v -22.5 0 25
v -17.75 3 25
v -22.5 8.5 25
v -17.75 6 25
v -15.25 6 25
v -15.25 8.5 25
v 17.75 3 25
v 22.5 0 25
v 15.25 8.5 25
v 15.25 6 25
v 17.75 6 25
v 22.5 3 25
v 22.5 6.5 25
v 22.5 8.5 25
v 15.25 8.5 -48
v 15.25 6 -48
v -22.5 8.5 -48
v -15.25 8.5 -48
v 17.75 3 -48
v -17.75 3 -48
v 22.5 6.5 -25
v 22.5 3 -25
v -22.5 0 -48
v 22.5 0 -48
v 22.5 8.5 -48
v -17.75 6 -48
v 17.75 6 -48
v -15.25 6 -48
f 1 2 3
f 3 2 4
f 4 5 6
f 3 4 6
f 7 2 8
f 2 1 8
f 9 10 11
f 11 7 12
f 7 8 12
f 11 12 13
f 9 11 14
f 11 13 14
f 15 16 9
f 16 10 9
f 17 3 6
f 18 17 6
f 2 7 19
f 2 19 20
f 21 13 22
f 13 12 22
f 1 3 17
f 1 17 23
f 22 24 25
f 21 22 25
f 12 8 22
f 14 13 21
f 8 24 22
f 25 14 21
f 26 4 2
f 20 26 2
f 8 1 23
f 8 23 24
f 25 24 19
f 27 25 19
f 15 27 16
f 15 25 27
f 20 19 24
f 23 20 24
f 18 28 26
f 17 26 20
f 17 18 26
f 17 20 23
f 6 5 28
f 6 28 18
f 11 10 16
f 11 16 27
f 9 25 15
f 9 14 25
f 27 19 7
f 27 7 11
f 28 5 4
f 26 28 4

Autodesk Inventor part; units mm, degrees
ref_plane "YZ Plane" through (0, 0, 0) normal (1, 0, 0) x (0, 1, 0)
ref_plane "XZ Plane" through (0, 0, 0) normal (0, 1, 0) x (-1, 0, 0)
ref_plane "XY Plane" through (0, 0, 0) normal (0, 0, 1) x (1, 0, 0)
sketch "Sketch1" plane through (0, 0, 0) normal (0, 1, 0) x (-1, 0, 0)
  line L0 (-32.5, 25) -> (32.5, 25)
  line L1 (32.5, 25) -> (32.5, -25)
  line L2 (32.5, -25) -> (-32.5, -25)
  line L3 (-32.5, -25) -> (-32.5, 25)
  line L4 (-32.5, 25) -> (32.5, -25) construction
  line L5 (32.5, 25) -> (-32.5, -25) construction
  point P0 (0, 0)
  dimension "d0" = 65
  dimension "d1" = 50
extrude "Extrusion1" add sketch "Sketch1" along normal blind 3
sketch "Sketch2" plane through (0, 3, 0) normal (0, 1, 0) x (1, 0, 0)
  line L0 (32.5, 25) -> (-32.5, 25) projected
  line L1 (-18.25, -25) -> (18.25, -25)
  line L2 (18.25, -25) -> (18.25, 25)
  line L3 (18.25, 25) -> (-18.25, 25)
  line L4 (-18.25, 25) -> (-18.25, -25)
  line L5 (-18.25, -25) -> (18.25, 25) construction
  line L6 (18.25, -25) -> (-18.25, 25) construction
  line L7 (-22.5, -25) -> (22.5, -25)
  line L8 (22.5, -25) -> (22.5, 25)
  line L9 (22.5, 25) -> (-22.5, 25)
  line L10 (-22.5, 25) -> (-22.5, -25)
  line L11 (-22.5, -25) -> (22.5, 25) construction
  line L12 (22.5, -25) -> (-22.5, 25) construction
  point P0 (0, 0)
  dimension "d4" = 36.5
  dimension "d5" = 45
extrude "Extrusion2" add sketch "Sketch2" along normal blind 3.5 contours L8 L7 L2 L0 | L4 L7 L10 L0
sketch "Sketch3" plane through (0, 6.5, 0) normal (0, 1, 0) x (1, 0, 0)
  line L0 (-22.5, 25) -> (-32.5, 25) projected
  line L1 (-22.5, 25) -> (-15.25, 25)
  line L2 (-15.25, 25) -> (-15.25, -25)
  line L3 (-15.25, -25) -> (-22.5, -25)
  line L4 (-22.5, -25) -> (-22.5, 25)
  line L5 (-32.5, -25) -> (32.5, -25) projected
  line L6 (32.5, 25) -> (-32.5, 25) projected
  line L7 (22.4999, -25) -> (15.2499, -25)
  line L8 (15.2499, -25) -> (15.2499, 25)
  line L9 (15.2499, 25) -> (22.4999, 25)
  line L10 (22.4999, 25) -> (22.4999, -25)
  point P0 (0, 0)
  dimension "d8" = 7.25
  dimension "d9" = 7.25
extrude "Extrusion3" add sketch "Sketch3" along normal blind 2 contours L1 L2 L3 L4 | L6 L10 L5 L8
sketch "Sketch4" plane through (0, 3, 0) normal (0, 1, 0) x (1, 0, 0)
  line L0 (-22.5, 25) -> (-22.5, -25) projected
  line L1 (-32.5, 25) -> (-32.5, -25) projected
  line L2 (-22.5, 25) -> (-32.5, 25)
  line L3 (-32.5, 25) -> (-32.5, -25)
  line L4 (-32.5, -25) -> (-22.5, -25)
  line L5 (-22.5, -25) -> (-22.5, 25)
  line L6 (22.4999, -25) -> (22.4999, 25) projected
  line L7 (-32.5, -25) -> (32.5, -25) projected
  line L8 (22.4999, 25) -> (32.5, 25)
  line L9 (32.5, 25) -> (32.5, -25)
  line L10 (32.5, -25) -> (22.4999, -25)
  line L11 (22.4999, -25) -> (22.4999, 25)
  point P0 (0, 0)
extrude "Extrusion4" cut sketch "Sketch4" against normal blind 10
sketch "Sketch5" plane through (-18.25, 3, 25) normal (1, 0, 0) x (0, 0, -1)
  line L0 (0, 3.5) -> (50, 3.5) projected
  line L1 (50, 0) -> (0, 0)
  line L2 (0, 0) -> (0, 3.5)
  line L3 (0, 3.5) -> (50, 3.5)
  line L4 (50, 3.5) -> (50, 0)
  point P0 (25, -3)
extrude "Extrusion5" add sketch "Sketch5" along normal blind 0.5
sketch "Sketch6" plane through (18.25, 3, -25) normal (-1, 0, 0) x (0, 0, 1)
  line L0 (50, 0) -> (50, 3.5) projected
  line L1 (0, 0) -> (0, -3) projected
  line L2 (50, 3.5) -> (0, 3.5)
  line L3 (0, 3.5) -> (0, 0)
  line L4 (0, 0) -> (50, 0)
  line L5 (50, 0) -> (50, 3.5)
  point P0 (25, -3)
extrude "Extrusion6" add sketch "Sketch6" along normal blind 0.5
sketch "Sketch7" plane through (0, 6.5, 0) normal (0, -1, 0) x (1, 0, 0)
  line L0 (15.2499, 25) -> (17.75, 25) projected
  line L1 (15.2499, -25) -> (17.75, -25)
  line L2 (17.75, -25) -> (17.75, 25)
  line L3 (17.75, 25) -> (15.2499, 25)
  line L4 (15.2499, 25) -> (15.2499, -25)
  line L5 (-15.25, 25) -> (-17.75, 25)
  line L6 (-17.75, 25) -> (-17.75, -25)
  line L7 (-17.75, -25) -> (-15.25, -25)
  line L8 (-15.25, -25) -> (-15.25, 25)
  point P0 (0, 0)
extrude "Extrusion7" add sketch "Sketch7" along normal blind 0.5
sketch "Sketch8" plane through (-15.25, 8.5, -25) normal (0, 0, -1) x (-1, 0, 0)
  line L0 (0, -2.5) -> (0, 0) projected
  line L1 (0, -2.5) -> (0, 0)
  line L2 (7.25, 0) -> (0, 0) projected
  line L3 (0, 0) -> (7.25, 0)
  line L4 (7.25, 0) -> (7.25, -8.5) projected
  line L5 (7.25, 0) -> (7.25, -8.5)
  line L6 (7.25, -8.5) -> (-37.7499, -8.5) projected
  line L7 (7.25, -8.5) -> (-37.7499, -8.5)
  line L8 (-37.7499, -2) -> (-37.7499, 0) projected
  line L9 (-37.7499, -8.5) -> (-37.7499, 0)
  line L10 (-37.7499, 0) -> (-30.4999, 0) projected
  line L11 (-37.7499, 0) -> (-30.4999, 0)
  line L12 (-30.4999, -2.5) -> (-30.4999, 0) projected
  line L13 (-30.4999, 0) -> (-30.4999, -2.5)
  line L14 (-30.4999, -2.5) -> (-33, -2.5)
  line L15 (-33, -5.5) -> (-33, -2.5) projected
  line L16 (-33, -2.5) -> (-33, -5.5)
  line L17 (-33, -5.5) -> (2.5, -5.5) projected
  line L18 (-33, -5.5) -> (2.5, -5.5)
  line L19 (2.5, -2.5) -> (2.5, -5.5) projected
  line L20 (2.5, -5.5) -> (2.5, -2.5)
  line L21 (0, -2.5) -> (2.5, -2.5) projected
  line L22 (2.5, -2.5) -> (0, -2.5)
  point P0 (-15.25, -8.5)
extrude "Extrusion8" add sketch "Sketch8" along normal blind 23
properties part number "DINsupport"
